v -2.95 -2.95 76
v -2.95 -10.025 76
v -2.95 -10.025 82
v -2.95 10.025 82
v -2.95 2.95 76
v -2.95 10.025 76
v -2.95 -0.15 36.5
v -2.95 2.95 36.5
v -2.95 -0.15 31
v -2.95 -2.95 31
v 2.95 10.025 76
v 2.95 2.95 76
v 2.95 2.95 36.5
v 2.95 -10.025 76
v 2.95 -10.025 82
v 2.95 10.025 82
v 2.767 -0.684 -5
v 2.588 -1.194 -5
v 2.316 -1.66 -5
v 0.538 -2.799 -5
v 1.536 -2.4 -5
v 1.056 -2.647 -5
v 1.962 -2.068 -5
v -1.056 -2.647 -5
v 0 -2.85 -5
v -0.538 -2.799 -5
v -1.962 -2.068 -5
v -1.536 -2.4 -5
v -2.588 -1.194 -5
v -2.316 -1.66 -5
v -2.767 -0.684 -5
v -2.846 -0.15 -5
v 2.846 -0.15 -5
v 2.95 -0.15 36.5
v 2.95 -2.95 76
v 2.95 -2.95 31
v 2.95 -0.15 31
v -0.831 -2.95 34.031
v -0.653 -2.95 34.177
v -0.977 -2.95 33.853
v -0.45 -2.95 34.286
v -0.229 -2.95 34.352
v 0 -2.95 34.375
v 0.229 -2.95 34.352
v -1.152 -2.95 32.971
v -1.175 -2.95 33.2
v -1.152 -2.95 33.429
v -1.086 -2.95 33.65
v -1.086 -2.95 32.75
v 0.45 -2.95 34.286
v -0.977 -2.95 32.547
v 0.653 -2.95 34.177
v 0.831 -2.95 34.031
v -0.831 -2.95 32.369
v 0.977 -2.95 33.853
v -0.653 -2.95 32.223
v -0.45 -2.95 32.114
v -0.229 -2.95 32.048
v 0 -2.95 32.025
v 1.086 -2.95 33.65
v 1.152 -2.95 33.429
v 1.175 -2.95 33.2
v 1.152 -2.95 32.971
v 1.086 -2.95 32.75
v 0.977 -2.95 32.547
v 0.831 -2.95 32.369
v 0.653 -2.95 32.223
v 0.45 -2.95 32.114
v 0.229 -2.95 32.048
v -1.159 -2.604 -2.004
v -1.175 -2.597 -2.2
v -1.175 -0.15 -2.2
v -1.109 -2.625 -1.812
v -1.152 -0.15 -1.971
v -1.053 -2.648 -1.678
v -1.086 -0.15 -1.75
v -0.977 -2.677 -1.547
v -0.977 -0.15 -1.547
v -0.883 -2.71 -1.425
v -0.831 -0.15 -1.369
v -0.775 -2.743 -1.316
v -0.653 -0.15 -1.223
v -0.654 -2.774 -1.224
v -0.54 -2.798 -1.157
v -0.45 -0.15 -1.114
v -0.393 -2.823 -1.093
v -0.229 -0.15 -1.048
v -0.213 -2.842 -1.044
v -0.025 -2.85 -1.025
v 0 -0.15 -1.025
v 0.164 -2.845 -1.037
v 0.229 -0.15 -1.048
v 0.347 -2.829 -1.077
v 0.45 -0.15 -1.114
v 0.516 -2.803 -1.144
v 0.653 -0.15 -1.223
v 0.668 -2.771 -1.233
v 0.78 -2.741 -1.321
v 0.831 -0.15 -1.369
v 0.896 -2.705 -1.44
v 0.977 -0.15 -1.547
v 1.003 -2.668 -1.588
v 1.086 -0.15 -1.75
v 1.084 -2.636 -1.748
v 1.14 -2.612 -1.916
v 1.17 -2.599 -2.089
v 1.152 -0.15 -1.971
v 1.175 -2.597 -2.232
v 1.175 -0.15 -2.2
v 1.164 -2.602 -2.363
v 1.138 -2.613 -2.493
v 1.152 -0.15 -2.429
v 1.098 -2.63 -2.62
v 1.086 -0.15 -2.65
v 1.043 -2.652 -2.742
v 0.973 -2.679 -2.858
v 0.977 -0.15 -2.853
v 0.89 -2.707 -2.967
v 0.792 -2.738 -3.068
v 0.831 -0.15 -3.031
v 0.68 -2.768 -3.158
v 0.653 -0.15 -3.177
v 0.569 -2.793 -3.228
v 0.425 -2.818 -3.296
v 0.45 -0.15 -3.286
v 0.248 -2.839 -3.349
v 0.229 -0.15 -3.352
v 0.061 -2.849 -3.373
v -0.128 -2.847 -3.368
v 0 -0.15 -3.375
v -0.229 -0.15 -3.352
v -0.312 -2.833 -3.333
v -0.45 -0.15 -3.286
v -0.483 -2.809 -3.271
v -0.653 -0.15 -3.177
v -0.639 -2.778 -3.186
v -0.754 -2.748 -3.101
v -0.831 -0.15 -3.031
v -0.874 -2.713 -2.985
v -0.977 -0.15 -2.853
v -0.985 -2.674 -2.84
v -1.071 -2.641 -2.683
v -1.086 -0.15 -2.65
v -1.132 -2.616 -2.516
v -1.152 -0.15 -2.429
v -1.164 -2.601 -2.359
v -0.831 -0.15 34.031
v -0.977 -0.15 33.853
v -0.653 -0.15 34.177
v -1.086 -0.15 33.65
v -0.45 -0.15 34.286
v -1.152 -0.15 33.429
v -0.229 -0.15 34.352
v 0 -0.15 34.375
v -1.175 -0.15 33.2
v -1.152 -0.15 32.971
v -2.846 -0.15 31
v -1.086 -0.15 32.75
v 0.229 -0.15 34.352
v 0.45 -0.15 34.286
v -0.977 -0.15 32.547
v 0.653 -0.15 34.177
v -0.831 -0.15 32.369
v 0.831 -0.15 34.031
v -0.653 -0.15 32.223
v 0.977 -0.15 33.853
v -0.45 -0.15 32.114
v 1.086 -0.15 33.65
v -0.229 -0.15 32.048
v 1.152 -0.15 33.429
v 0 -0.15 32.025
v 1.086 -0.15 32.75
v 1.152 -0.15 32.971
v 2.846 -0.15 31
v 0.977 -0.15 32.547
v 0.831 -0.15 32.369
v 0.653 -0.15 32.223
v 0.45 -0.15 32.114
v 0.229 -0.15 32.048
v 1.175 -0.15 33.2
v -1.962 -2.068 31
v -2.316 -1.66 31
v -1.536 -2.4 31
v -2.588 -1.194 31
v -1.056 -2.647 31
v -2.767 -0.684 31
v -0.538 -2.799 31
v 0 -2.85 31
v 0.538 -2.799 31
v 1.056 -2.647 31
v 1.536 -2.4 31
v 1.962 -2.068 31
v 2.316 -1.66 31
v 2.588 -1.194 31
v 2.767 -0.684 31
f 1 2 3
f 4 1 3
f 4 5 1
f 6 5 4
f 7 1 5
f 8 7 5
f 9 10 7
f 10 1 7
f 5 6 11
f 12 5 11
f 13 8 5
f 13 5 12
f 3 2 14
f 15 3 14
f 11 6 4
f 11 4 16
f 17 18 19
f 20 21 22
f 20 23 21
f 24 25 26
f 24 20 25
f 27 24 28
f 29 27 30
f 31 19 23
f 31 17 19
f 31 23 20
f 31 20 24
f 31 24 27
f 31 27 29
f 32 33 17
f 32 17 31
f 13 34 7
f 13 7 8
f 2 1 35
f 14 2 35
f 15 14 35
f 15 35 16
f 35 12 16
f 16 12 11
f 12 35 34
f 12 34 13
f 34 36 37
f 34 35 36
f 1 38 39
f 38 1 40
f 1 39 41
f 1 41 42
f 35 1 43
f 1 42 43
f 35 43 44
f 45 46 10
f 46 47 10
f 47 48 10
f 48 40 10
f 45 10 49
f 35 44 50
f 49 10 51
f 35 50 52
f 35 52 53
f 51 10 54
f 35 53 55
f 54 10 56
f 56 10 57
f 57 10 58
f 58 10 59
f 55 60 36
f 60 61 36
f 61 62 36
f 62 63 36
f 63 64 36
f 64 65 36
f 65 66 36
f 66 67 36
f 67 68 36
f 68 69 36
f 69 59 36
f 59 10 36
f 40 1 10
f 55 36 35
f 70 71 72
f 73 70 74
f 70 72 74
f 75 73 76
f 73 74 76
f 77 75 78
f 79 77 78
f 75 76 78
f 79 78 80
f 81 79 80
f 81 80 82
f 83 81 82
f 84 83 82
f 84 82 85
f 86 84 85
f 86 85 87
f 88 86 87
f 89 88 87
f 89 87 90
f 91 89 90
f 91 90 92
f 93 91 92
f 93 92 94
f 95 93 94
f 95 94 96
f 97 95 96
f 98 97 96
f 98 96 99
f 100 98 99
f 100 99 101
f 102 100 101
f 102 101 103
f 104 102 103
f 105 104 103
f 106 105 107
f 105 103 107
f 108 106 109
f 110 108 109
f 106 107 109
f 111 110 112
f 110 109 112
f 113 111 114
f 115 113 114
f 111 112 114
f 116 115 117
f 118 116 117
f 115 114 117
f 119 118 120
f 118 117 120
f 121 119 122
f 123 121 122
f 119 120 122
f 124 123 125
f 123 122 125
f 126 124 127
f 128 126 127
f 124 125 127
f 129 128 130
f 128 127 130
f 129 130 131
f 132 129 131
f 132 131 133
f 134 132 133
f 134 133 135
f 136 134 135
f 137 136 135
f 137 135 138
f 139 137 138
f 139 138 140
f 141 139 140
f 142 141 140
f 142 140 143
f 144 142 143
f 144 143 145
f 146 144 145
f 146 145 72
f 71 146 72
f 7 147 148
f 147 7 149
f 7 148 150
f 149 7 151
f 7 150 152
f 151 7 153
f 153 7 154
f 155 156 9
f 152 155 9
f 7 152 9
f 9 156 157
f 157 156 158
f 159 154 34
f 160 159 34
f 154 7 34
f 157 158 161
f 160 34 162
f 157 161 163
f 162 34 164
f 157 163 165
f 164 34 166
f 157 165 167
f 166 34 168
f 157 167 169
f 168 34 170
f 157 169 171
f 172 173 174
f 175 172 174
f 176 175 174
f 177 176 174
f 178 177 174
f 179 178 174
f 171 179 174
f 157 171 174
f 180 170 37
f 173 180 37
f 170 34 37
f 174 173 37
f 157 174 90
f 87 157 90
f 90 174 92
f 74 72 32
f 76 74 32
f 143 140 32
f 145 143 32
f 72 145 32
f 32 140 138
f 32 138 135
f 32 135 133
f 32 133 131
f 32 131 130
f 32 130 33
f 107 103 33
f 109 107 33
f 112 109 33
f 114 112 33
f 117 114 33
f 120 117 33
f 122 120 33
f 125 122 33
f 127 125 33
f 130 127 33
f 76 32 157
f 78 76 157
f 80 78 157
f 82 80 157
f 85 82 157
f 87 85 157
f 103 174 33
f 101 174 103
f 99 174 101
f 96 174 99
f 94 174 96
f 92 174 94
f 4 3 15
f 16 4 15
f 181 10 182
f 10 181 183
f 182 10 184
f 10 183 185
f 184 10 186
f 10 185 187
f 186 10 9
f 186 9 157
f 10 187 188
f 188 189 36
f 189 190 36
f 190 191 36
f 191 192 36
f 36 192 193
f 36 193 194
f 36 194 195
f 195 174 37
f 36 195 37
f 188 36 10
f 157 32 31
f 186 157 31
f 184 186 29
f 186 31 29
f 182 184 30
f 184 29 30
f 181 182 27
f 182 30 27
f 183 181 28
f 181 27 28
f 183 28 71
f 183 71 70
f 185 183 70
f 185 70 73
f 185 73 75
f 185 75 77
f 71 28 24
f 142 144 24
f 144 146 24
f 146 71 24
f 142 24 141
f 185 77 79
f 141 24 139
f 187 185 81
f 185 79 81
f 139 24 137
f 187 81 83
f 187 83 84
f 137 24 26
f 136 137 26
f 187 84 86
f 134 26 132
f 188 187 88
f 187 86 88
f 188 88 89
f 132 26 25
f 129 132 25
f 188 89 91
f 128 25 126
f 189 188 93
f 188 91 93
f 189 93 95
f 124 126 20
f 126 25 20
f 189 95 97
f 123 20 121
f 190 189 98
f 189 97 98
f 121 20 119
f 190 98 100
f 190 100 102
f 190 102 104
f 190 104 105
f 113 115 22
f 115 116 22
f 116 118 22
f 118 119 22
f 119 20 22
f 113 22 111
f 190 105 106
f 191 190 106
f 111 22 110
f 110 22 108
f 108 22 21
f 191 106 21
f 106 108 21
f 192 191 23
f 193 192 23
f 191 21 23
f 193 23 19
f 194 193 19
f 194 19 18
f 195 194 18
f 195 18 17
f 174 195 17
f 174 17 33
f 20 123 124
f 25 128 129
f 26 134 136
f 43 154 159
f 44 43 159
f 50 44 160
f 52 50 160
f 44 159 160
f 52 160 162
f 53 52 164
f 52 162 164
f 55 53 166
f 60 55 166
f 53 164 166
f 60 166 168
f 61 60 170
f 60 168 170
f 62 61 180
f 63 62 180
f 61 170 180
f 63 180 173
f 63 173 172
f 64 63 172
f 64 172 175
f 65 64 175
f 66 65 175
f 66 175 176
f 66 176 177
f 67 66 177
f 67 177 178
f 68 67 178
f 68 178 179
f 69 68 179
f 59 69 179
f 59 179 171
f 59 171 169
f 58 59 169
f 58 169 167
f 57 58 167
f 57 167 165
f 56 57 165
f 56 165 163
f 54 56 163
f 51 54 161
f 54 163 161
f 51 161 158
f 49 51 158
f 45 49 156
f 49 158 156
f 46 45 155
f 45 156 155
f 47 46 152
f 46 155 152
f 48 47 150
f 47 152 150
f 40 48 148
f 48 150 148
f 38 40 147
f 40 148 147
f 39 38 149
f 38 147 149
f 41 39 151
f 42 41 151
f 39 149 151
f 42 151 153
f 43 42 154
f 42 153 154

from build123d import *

# Parameters (mm, degrees)
SKETCH_1_R           = 2.85
EXTRUDE_1_DEPTH      = 31
SKETCH_3_W           = 5.9
SKETCH_3_H           = 5.9
EXTRUDE_2_DEPTH      = 5
SKETCH_4_R           = 5
EXTRUDE_3_DEPTH      = 7
SKETCH_6_R           = 11.5
EXTRUDE_4_DEPTH      = 2
SKETCH_8_R           = 4.5
CUT_EXTRUDE_2_DEPTH  = 7.5
SKETCH_9_R           = 1.25
CUT_EXTRUDE_3_DEPTH  = 5.5
SKETCH_10_R          = 1.175
CUT_EXTRUDE_7_DEPTH  = 10
SKETCH_12_W          = 5.9
SKETCH_12_H          = 5.9
EXTRUDE_5_DEPTH      = 45
SKETCH_15_W          = 5.9
SKETCH_15_H          = 20.04910328
EXTRUDE_6_DEPTH      = 6
SKETCH_16_R          = 1.175
CUT_EXTRUDE_8_DEPTH  = 10
SKETCH_21_W          = 41.5
SKETCH_21_H          = 3.1
CUT_EXTRUDE_9_DEPTH  = 10
SKETCH_22_OUTSIDE_W  = 45.272
SKETCH_22_OUTSIDE_H  = 45.272
SKETCH_22_OUTSIDE_R  = 2.85
CUT_EXTRUDE_10_DEPTH = 5
SKETCH_23_R          = 14.411618967
CUT_EXTRUDE_11_DEPTH = 9


with BuildPart() as part:
    # 스케치1 → 보스-돌출1 (new body)
    with BuildSketch(Plane.XY):
        Circle(SKETCH_1_R)
    extrude(amount=EXTRUDE_1_DEPTH)

    # 스케치3 → 보스-돌출2 (add)
    with BuildSketch(Plane(origin=(0, 0, 0), x_dir=(-1, 0, 0), z_dir=(0, 0, -1))):
        Rectangle(SKETCH_3_W, SKETCH_3_H)
    extrude(amount=EXTRUDE_2_DEPTH)

    # 스케치4 → 보스-돌출3 (add)
    with BuildSketch(Plane(origin=(0, 0, -5), x_dir=(-1, 0, 0), z_dir=(0, 0, -1))):
        Circle(SKETCH_4_R)
    extrude(amount=EXTRUDE_3_DEPTH)

    # 스케치6 → 보스-돌출4 (add)
    with BuildSketch(Plane(origin=(0, 0, -12), x_dir=(-1, 0, 0), z_dir=(0, 0, -1))):
        Circle(SKETCH_6_R)
    extrude(amount=EXTRUDE_4_DEPTH)

    # 스케치8 → 컷-돌출2 (cut)
    with BuildSketch(Plane(origin=(0, 0, -14), x_dir=(-1, 0, 0), z_dir=(0, 0, -1))):
        Circle(SKETCH_8_R)
    extrude(amount=-CUT_EXTRUDE_2_DEPTH, mode=Mode.SUBTRACT)

    # 스케치9 → 컷-돌출3 (cut)
    with BuildSketch(Plane(origin=(0, 0, -14), x_dir=(-1, 0, 0), z_dir=(0, 0, -1))):
        with Locations((3.444150891, 8.314915793)):
            Circle(SKETCH_9_R)
        with Locations((-3.444150891, 8.314915793)):
            Circle(SKETCH_9_R)
        with Locations((8.314915793, 3.444150891)):
            Circle(SKETCH_9_R)
        with Locations((8.314915793, -3.444150891)):
            Circle(SKETCH_9_R)
        with Locations((3.444150891, -8.314915793)):
            Circle(SKETCH_9_R)
        with Locations((-3.444150891, -8.314915793)):
            Circle(SKETCH_9_R)
        with Locations((-8.314915793, -3.444150891)):
            Circle(SKETCH_9_R)
        with Locations((-8.314915793, 3.444150891)):
            Circle(SKETCH_9_R)
    extrude(amount=-CUT_EXTRUDE_3_DEPTH, mode=Mode.SUBTRACT)

    # 스케치10 → 컷-돌출7 (cut)
    with BuildSketch(Plane(origin=(0, 2.95, 0), x_dir=(1, 0, 0), z_dir=(0, 1, 0))):
        with Locations(Location((0, 2.2, 0), (0, 0, 180))):
            Circle(SKETCH_10_R)
    extrude(amount=-CUT_EXTRUDE_7_DEPTH, mode=Mode.SUBTRACT)

    # 스케치12 → 보스-돌출5 (add)
    with BuildSketch(Plane.XY.offset(31)):
        Rectangle(SKETCH_12_W, SKETCH_12_H)
    extrude(amount=EXTRUDE_5_DEPTH)

    # 스케치15 → 보스-돌출6 (add)
    with BuildSketch(Plane.XY.offset(76)):
        Rectangle(SKETCH_15_W, SKETCH_15_H)
    extrude(amount=EXTRUDE_6_DEPTH)

    # 스케치16 → 컷-돌출8 (cut)
    with BuildSketch(Plane(origin=(0, 2.95, 0), x_dir=(1, 0, 0), z_dir=(0, 1, 0))):
        with Locations(Location((0, -33.2, 0), (0, 0, 270))):
            Circle(SKETCH_16_R)
    extrude(amount=-CUT_EXTRUDE_8_DEPTH, mode=Mode.SUBTRACT)

    # 스케치21 → 컷-돌출9 (cut)
    with BuildSketch(Plane(origin=(2.95, 0, 0), x_dir=(0, 0, -1), z_dir=(1, 0, 0))):
        with Locations((-15.75, 1.4)):
            Rectangle(SKETCH_21_W, SKETCH_21_H)
    extrude(amount=-CUT_EXTRUDE_9_DEPTH, mode=Mode.SUBTRACT)

    # 스케치22 outside → 컷-돌출10 (cut)
    with BuildSketch(Plane.XY):
        Rectangle(SKETCH_22_OUTSIDE_W, SKETCH_22_OUTSIDE_H)
        Circle(SKETCH_22_OUTSIDE_R, mode=Mode.SUBTRACT)
    extrude(amount=-CUT_EXTRUDE_10_DEPTH, mode=Mode.SUBTRACT)

    # 스케치23 → 컷-돌출11 (cut)
    with BuildSketch(Plane(origin=(0, 0, -14), x_dir=(-1, 0, 0), z_dir=(0, 0, -1))):
        Circle(SKETCH_23_R)
    extrude(amount=-CUT_EXTRUDE_11_DEPTH, mode=Mode.SUBTRACT)


solid = part.part
